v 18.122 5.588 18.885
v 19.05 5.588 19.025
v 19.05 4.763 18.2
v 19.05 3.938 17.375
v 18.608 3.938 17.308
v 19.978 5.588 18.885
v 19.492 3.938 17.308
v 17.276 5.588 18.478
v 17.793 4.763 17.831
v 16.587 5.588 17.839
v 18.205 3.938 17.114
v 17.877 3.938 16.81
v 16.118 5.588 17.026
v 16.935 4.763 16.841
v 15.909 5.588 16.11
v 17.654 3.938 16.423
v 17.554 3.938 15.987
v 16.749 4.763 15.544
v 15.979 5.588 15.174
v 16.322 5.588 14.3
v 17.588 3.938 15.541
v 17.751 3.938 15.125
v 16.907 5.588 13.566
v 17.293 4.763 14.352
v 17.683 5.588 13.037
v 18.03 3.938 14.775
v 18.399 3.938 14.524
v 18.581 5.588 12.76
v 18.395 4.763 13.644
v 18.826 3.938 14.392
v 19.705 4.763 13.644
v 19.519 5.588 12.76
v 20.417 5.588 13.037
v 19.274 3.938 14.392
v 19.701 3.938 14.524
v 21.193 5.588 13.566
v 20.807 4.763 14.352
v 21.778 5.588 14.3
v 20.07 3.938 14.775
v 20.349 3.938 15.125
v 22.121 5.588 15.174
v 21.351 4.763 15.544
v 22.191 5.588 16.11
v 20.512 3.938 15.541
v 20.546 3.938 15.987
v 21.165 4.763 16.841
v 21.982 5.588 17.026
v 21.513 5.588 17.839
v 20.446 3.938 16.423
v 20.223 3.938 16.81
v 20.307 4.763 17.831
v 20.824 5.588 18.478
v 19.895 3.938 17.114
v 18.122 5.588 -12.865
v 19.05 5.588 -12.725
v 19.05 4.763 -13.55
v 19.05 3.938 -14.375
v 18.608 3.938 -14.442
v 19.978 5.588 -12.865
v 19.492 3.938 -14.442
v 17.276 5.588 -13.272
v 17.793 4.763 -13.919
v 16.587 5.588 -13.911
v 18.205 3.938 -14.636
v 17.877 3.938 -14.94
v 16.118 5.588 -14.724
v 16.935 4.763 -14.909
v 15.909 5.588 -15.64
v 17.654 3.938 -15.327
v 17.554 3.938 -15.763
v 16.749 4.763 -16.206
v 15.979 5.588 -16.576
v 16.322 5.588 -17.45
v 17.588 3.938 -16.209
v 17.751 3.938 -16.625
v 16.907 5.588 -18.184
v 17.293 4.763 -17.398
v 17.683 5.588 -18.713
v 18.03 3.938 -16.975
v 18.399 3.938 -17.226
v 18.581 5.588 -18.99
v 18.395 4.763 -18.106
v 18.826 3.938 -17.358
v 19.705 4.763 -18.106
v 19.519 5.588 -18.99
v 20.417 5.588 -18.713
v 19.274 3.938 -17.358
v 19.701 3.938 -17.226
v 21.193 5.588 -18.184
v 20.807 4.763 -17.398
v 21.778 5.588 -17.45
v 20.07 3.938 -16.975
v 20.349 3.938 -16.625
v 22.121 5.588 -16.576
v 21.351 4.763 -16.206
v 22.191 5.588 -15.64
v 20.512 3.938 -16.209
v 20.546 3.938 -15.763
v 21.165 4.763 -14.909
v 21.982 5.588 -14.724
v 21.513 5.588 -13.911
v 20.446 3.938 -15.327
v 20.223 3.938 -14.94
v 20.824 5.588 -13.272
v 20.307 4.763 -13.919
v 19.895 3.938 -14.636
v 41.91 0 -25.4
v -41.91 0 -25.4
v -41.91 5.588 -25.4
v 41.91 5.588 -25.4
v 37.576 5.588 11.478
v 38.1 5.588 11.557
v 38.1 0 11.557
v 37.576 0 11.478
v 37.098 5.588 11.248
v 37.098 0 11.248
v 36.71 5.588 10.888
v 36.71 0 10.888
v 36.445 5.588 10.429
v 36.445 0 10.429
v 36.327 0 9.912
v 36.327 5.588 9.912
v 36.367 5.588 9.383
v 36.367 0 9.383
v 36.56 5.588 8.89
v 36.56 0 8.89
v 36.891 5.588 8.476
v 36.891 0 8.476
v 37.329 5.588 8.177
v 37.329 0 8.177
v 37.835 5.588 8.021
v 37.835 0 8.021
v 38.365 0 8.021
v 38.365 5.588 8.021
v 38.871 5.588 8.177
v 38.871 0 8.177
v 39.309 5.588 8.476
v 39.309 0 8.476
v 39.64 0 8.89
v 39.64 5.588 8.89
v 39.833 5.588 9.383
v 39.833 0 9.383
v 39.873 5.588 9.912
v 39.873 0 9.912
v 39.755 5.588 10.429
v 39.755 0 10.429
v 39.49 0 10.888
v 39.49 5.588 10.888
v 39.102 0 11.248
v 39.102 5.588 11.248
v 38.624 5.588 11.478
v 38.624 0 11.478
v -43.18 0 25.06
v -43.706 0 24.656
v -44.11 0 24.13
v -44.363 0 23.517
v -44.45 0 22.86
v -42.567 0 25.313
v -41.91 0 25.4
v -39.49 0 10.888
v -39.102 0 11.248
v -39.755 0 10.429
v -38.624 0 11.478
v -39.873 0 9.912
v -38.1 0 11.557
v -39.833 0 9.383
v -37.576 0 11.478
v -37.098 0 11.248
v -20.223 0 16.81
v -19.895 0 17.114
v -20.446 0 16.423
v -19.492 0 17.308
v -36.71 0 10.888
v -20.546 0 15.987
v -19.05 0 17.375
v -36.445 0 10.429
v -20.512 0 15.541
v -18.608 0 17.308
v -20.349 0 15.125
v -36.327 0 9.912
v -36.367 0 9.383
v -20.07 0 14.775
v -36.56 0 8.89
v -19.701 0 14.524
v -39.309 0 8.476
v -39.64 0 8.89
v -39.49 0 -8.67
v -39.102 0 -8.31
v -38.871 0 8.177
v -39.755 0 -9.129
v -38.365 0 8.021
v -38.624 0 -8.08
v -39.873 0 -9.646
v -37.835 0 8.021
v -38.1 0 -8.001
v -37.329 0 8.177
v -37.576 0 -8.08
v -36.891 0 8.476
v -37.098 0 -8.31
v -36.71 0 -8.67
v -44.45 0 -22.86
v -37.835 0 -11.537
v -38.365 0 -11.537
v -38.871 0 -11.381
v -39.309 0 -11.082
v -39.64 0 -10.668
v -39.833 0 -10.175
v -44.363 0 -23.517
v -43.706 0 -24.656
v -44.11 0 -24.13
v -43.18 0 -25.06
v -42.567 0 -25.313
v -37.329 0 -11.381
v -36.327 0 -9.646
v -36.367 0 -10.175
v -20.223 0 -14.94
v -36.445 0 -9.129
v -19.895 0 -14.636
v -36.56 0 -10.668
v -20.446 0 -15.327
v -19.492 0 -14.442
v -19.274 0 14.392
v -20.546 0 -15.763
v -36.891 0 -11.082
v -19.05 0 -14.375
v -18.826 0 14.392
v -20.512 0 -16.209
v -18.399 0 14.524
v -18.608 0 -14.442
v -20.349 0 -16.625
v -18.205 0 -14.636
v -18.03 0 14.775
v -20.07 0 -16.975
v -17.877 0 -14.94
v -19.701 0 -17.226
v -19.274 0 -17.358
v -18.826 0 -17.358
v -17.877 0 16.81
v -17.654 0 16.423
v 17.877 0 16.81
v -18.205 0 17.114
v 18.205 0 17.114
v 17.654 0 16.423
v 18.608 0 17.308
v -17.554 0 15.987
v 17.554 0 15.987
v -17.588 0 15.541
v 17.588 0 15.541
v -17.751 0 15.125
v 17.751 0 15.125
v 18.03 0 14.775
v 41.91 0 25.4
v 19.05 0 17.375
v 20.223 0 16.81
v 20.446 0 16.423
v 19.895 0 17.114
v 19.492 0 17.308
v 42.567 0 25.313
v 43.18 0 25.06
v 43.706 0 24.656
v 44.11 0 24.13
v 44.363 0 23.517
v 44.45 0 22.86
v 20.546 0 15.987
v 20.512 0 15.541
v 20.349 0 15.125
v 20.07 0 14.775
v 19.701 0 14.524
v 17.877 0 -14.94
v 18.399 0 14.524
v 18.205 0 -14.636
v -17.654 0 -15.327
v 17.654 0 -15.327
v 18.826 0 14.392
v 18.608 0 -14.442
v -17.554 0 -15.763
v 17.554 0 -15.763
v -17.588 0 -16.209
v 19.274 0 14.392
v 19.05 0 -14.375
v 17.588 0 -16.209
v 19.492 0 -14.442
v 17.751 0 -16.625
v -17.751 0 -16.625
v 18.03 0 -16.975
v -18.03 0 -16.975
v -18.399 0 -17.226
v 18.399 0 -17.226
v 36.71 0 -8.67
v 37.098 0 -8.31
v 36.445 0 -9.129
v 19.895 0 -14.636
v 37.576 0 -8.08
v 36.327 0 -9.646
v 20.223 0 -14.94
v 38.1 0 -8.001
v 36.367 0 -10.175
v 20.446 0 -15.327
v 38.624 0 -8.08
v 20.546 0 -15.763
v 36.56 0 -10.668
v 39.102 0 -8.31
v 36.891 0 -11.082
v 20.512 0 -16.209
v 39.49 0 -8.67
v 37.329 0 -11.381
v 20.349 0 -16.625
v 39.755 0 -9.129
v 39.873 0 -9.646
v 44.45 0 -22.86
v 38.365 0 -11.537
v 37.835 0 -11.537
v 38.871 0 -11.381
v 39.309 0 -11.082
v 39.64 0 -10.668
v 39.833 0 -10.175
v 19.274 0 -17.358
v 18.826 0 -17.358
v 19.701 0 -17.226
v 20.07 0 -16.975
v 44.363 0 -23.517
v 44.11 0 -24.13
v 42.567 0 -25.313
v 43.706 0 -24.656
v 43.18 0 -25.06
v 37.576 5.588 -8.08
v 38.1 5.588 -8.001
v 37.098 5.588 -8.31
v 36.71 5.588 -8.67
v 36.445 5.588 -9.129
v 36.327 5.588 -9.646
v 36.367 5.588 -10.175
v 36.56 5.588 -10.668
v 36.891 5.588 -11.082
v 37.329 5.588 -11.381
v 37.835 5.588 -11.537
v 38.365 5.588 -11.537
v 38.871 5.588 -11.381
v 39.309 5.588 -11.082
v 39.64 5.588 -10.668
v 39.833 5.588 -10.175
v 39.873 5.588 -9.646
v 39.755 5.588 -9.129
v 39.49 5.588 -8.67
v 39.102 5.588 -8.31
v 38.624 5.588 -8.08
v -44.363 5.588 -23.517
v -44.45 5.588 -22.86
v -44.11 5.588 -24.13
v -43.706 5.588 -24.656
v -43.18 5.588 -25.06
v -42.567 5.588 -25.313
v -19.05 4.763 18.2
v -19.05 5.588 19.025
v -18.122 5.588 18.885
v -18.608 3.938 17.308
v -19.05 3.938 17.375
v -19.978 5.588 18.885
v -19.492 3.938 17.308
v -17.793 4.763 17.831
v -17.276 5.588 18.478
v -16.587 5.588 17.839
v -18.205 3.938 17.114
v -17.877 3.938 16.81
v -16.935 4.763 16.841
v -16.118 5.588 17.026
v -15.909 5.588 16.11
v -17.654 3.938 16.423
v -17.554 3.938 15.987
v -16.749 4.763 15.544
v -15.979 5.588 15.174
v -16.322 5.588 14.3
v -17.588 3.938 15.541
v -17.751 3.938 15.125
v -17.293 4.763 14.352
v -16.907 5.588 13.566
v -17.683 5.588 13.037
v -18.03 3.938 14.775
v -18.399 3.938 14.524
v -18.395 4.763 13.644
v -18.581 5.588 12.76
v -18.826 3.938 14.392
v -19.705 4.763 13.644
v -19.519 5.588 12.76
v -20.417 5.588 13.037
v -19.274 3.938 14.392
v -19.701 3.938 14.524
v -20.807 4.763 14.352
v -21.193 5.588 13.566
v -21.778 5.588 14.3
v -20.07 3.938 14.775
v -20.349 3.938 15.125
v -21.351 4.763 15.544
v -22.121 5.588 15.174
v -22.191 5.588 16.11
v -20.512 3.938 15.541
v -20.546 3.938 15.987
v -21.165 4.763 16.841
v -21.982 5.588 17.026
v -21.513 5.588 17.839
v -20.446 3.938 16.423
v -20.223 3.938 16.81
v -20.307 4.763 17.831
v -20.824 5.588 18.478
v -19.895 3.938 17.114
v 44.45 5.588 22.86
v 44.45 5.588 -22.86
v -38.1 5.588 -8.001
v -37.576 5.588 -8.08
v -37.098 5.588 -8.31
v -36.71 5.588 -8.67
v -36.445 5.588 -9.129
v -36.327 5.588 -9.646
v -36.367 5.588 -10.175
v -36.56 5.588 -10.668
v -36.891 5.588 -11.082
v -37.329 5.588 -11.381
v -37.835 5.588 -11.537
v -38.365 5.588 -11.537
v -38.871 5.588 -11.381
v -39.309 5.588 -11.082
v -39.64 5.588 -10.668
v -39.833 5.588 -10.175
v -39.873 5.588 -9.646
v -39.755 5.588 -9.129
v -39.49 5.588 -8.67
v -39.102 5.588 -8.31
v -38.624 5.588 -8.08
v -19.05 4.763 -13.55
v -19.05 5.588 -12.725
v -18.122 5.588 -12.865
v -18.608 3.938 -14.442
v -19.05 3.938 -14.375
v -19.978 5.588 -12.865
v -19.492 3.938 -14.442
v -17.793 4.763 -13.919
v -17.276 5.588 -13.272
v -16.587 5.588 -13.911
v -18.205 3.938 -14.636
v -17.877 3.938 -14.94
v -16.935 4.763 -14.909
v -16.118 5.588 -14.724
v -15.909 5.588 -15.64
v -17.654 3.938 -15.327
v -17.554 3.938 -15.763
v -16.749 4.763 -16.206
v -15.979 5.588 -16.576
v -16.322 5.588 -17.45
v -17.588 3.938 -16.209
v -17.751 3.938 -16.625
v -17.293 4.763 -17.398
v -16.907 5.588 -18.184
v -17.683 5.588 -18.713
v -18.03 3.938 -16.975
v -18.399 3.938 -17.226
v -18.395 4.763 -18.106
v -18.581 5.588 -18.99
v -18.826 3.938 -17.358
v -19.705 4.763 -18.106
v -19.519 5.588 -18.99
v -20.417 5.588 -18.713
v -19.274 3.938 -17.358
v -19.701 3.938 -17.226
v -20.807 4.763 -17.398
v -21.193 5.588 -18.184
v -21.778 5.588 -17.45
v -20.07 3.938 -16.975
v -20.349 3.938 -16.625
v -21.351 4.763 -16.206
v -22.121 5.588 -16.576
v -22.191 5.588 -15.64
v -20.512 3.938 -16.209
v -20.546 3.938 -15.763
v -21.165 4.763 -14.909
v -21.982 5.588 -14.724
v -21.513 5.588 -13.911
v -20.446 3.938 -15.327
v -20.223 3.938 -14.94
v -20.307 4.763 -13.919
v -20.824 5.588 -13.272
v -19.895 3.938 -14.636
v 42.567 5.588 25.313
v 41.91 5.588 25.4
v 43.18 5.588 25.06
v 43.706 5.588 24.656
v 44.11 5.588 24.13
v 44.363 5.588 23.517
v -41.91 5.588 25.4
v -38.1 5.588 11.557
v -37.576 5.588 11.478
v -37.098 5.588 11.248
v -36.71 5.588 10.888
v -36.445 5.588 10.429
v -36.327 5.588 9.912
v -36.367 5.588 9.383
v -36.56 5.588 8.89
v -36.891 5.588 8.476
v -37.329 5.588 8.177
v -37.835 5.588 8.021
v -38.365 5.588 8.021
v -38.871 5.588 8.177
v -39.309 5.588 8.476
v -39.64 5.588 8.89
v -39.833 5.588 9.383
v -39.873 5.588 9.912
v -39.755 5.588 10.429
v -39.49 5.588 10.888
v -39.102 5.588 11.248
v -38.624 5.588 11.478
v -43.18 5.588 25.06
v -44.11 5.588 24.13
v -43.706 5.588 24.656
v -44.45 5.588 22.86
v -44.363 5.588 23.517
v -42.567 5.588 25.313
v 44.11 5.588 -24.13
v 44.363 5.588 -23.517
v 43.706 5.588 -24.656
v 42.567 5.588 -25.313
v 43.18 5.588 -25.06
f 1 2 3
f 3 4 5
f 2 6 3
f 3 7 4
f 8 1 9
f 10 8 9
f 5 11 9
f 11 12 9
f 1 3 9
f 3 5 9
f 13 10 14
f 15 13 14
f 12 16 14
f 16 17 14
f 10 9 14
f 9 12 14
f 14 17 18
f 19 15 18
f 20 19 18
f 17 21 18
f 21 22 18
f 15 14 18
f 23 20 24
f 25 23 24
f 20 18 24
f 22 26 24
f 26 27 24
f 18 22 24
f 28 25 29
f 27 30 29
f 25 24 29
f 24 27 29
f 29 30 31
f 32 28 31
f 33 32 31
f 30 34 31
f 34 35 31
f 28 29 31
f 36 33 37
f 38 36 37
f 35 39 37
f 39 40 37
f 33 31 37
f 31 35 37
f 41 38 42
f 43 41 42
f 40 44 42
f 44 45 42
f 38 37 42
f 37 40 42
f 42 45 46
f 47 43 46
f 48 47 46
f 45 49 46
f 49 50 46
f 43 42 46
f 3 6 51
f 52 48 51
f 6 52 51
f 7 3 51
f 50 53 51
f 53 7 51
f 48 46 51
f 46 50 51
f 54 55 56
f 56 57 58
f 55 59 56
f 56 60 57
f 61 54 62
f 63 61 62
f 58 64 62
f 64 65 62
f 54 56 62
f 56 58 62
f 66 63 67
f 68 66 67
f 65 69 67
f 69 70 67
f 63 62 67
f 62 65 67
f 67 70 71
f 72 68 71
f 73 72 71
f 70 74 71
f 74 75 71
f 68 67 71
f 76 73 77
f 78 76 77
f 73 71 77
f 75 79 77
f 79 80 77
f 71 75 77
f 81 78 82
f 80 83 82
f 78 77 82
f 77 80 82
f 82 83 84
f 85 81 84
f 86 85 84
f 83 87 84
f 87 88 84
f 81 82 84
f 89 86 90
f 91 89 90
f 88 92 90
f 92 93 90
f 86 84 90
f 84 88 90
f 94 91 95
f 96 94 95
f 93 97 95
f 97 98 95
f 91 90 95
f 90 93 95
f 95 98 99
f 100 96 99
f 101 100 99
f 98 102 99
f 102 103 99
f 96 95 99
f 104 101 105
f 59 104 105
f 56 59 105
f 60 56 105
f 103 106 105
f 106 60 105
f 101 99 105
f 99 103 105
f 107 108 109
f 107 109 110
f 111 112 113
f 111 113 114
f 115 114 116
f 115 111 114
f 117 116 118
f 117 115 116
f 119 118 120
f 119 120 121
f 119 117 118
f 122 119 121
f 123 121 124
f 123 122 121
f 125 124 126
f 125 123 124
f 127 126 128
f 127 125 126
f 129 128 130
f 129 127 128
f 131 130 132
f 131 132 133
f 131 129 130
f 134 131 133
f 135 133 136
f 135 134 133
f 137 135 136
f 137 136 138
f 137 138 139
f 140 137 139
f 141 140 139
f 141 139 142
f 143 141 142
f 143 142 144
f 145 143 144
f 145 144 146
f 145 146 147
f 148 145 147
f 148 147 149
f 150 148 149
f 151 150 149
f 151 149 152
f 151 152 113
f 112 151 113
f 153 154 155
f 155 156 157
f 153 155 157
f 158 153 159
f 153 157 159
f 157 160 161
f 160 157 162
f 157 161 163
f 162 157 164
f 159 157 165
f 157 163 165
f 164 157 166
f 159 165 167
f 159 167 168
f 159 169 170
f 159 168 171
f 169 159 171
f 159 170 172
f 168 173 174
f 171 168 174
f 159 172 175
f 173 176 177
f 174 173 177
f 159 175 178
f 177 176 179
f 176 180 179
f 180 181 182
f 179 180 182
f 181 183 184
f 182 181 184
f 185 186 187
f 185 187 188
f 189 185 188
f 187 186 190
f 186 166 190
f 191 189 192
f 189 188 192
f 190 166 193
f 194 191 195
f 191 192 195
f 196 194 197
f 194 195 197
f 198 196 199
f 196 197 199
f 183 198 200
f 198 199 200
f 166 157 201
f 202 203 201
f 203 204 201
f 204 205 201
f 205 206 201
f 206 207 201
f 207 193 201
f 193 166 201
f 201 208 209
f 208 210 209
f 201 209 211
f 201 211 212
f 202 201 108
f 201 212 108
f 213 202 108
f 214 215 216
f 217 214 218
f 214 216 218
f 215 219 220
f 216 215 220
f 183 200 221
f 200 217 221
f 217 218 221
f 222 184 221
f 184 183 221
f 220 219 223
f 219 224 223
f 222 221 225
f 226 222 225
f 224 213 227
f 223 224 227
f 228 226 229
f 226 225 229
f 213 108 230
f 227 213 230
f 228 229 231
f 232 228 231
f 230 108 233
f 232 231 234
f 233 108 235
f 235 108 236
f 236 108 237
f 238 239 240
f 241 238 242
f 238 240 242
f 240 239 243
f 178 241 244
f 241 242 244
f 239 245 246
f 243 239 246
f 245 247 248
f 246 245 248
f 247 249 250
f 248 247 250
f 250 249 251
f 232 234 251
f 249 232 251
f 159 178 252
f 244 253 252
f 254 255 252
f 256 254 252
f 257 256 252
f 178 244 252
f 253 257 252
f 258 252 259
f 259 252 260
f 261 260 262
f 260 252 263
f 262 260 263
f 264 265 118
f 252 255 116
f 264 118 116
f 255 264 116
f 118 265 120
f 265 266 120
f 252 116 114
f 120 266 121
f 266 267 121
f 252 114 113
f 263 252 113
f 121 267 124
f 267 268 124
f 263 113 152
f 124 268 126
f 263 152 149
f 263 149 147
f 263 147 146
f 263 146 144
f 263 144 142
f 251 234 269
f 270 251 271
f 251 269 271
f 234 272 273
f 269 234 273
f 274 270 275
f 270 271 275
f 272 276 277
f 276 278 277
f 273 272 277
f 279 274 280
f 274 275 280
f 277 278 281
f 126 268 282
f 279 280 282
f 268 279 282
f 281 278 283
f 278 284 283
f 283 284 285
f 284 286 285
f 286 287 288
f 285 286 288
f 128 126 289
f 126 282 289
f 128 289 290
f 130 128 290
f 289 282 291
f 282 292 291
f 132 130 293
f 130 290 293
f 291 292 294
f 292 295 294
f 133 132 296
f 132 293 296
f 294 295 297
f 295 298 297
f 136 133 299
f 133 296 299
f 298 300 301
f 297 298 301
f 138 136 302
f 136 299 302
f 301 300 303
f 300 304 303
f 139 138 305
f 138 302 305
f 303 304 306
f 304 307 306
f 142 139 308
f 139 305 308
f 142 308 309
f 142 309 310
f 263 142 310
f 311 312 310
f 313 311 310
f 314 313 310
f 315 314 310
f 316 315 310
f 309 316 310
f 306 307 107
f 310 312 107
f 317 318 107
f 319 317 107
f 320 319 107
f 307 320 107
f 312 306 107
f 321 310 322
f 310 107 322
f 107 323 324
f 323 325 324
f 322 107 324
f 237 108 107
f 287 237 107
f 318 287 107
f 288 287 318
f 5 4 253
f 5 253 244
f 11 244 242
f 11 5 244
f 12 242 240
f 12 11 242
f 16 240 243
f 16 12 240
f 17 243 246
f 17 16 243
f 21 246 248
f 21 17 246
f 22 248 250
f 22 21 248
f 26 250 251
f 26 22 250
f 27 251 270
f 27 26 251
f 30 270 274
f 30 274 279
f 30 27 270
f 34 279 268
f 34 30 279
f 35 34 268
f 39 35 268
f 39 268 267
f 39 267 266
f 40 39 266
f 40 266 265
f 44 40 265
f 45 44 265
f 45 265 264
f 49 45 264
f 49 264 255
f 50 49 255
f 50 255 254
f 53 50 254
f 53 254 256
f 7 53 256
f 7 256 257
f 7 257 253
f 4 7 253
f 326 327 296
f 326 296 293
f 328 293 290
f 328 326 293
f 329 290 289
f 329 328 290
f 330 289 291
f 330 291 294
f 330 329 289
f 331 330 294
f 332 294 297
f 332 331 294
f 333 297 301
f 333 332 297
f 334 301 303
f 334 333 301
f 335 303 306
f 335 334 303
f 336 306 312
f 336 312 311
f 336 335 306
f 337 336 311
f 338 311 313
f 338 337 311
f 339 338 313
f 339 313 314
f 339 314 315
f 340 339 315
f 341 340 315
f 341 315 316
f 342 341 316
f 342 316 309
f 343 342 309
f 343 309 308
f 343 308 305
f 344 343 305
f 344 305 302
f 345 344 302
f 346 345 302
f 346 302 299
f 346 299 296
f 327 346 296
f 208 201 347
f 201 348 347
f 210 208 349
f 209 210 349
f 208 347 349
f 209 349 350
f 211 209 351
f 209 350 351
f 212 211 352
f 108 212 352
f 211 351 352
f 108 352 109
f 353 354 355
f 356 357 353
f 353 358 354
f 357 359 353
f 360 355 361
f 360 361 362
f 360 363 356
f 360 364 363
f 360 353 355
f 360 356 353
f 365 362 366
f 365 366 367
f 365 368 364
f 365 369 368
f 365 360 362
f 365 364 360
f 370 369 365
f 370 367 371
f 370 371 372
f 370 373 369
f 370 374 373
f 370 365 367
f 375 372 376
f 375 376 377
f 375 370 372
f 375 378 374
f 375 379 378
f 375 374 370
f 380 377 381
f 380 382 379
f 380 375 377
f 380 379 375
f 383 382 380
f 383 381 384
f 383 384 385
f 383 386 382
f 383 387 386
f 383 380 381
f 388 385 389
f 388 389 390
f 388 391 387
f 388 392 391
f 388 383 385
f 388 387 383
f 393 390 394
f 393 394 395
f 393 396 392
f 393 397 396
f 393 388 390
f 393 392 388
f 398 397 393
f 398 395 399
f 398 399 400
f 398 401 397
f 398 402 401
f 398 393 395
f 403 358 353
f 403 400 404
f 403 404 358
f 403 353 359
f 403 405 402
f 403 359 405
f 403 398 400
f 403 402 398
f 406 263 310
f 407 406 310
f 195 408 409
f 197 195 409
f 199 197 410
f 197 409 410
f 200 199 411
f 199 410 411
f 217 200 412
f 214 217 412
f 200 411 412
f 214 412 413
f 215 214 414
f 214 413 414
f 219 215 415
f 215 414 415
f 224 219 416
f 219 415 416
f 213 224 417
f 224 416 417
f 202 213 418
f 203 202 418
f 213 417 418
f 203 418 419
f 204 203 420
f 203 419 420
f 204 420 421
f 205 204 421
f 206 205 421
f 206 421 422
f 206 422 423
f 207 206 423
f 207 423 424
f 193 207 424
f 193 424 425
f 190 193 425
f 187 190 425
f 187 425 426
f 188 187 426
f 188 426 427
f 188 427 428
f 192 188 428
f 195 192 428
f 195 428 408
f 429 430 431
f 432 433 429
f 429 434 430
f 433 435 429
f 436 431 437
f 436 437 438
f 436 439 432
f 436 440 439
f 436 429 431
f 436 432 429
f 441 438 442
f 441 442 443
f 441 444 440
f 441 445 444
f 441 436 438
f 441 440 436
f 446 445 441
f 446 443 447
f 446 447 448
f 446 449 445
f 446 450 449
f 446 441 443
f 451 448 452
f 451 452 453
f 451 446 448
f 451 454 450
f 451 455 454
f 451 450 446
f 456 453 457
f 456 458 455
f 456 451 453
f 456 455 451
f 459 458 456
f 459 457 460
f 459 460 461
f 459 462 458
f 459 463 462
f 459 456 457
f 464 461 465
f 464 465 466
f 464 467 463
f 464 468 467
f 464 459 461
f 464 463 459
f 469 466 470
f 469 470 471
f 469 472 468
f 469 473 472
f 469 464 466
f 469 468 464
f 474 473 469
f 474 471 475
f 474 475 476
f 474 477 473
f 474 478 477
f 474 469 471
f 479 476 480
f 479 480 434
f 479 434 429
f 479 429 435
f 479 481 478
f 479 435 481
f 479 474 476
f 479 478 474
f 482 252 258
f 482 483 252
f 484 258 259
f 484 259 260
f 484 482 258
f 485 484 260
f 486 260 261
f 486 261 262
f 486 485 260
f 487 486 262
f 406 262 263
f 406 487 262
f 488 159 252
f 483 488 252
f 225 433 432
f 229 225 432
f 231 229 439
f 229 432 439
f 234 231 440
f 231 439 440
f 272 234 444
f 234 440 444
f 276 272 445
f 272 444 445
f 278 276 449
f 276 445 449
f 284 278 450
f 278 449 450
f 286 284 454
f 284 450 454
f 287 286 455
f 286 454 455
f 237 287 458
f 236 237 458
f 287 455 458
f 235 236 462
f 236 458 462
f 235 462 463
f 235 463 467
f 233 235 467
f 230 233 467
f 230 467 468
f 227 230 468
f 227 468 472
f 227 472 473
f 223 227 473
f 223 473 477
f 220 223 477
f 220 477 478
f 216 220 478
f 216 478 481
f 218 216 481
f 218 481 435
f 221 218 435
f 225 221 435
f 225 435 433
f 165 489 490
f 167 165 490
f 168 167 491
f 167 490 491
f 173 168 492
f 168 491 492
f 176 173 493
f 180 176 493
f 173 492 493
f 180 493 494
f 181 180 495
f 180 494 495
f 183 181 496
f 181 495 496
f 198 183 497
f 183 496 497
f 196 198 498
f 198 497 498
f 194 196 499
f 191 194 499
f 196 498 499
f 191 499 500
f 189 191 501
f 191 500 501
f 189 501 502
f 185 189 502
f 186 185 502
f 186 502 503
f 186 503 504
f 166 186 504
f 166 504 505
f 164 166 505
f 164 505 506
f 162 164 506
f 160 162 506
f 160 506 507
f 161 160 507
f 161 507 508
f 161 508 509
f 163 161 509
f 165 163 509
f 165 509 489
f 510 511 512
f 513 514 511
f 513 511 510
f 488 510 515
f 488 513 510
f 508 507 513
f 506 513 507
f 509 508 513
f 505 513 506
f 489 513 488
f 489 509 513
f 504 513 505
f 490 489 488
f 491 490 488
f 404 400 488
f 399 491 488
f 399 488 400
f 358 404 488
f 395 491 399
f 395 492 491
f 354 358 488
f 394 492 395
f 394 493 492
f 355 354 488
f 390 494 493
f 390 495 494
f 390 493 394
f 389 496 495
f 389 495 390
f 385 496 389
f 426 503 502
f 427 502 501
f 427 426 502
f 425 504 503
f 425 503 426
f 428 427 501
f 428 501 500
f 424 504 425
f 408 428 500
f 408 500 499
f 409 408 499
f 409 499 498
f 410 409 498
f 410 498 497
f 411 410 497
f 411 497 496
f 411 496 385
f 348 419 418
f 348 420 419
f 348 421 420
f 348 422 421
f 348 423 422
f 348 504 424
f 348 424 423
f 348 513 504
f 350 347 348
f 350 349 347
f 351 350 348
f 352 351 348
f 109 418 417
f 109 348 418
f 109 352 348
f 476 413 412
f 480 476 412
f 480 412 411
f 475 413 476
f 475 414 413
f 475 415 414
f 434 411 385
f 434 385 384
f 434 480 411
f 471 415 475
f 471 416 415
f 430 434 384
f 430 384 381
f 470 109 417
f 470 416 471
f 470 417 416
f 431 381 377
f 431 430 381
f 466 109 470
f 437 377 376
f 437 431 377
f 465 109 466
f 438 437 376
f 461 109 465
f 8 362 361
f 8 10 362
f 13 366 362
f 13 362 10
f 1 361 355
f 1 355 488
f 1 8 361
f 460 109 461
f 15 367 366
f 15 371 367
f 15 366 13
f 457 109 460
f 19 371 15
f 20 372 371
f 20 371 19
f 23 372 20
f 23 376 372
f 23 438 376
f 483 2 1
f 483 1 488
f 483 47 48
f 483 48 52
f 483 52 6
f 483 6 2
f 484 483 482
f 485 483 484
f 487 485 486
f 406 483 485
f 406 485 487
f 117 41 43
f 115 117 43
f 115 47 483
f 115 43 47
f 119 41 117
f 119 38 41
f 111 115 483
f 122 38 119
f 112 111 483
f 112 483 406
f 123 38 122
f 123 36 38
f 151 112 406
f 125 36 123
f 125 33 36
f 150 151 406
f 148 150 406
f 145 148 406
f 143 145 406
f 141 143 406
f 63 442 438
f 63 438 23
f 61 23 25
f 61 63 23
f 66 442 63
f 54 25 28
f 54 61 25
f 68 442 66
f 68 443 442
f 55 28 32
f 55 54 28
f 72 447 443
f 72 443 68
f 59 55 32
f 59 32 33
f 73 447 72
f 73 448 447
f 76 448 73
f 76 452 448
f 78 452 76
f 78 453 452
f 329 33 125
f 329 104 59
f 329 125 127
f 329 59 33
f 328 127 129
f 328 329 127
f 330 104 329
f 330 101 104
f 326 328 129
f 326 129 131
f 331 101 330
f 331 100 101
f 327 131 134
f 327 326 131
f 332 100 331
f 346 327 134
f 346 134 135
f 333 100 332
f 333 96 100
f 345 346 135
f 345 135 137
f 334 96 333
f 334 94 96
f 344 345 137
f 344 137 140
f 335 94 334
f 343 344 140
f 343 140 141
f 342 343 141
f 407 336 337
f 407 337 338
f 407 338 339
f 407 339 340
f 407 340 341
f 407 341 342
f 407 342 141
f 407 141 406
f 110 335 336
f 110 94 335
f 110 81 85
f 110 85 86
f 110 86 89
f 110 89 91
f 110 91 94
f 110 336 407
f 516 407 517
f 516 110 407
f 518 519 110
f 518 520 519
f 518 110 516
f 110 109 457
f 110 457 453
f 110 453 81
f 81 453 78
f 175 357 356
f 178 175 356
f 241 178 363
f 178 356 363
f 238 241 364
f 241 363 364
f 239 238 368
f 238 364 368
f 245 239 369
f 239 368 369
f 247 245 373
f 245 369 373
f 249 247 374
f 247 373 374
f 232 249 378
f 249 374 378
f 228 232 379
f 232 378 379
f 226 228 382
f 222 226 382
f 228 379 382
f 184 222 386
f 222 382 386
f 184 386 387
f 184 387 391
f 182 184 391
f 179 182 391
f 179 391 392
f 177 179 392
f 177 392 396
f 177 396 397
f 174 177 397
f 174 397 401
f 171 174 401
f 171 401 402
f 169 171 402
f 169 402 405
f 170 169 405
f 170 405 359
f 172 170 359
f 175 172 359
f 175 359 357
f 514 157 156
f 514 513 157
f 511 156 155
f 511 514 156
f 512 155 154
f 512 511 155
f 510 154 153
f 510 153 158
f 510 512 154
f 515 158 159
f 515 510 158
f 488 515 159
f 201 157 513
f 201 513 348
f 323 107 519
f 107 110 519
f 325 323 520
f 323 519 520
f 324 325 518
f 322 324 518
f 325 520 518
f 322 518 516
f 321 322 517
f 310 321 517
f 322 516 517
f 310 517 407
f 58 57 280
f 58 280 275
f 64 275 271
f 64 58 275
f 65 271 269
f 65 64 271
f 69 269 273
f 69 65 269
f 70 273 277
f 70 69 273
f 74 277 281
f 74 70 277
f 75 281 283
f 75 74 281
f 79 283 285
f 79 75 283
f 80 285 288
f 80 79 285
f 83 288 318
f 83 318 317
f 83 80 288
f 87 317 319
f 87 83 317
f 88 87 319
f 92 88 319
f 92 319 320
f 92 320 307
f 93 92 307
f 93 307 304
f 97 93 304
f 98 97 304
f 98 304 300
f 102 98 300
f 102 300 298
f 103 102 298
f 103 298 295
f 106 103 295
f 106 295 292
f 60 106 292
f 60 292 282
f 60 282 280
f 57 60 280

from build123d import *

# Parameters (mm, degrees)
SKETCH1_W           = 88.9
SKETCH1_H           = 50.8
BOSS_EXTRUDE1_DEPTH = 5.588
CUT_EXTRUDE1_REACH  = 53.499
SKETCH2_R           = 1.778
SKETCH2_R_2         = 1.5
FILLET1_R           = 2.54
CHAMFER1_SIZE       = 1.65


with BuildPart() as part:
    # Sketch1 → Boss-Extrude1 (new body)
    with BuildSketch(Plane(origin=(0, 0, 0), x_dir=(1, 0, 0), z_dir=(0, 1, 0))):
        Rectangle(SKETCH1_W, SKETCH1_H)
    extrude(amount=BOSS_EXTRUDE1_DEPTH)

    # Sketch2 → Cut-Extrude1 (cut, up to next)
    with BuildSketch(Plane(origin=(0, 5.588, 0), x_dir=(1, 0, 0), z_dir=(0, 1, 0)), mode=Mode.PRIVATE) as cut_extrude1_sk1:
        with Locations(Location((-38.1, -9.779, 0), (0, 0, 270))):
            Circle(SKETCH2_R)
    cut_extrude1_tool1 = extrude(cut_extrude1_sk1.sketch, amount=-CUT_EXTRUDE1_REACH, mode=Mode.PRIVATE) & part.part
    # Sketch2 → Cut-Extrude1 (cut, up to next)
    with BuildSketch(Plane(origin=(0, 5.588, 0), x_dir=(1, 0, 0), z_dir=(0, 1, 0)), mode=Mode.PRIVATE) as cut_extrude1_sk2:
        with Locations(Location((-38.1, 9.779, 0), (0, 0, 270))):
            Circle(SKETCH2_R)
    cut_extrude1_tool2 = extrude(cut_extrude1_sk2.sketch, amount=-CUT_EXTRUDE1_REACH, mode=Mode.PRIVATE) & part.part
    # Sketch2 → Cut-Extrude1 (cut, up to next)
    with BuildSketch(Plane(origin=(0, 5.588, 0), x_dir=(1, 0, 0), z_dir=(0, 1, 0)), mode=Mode.PRIVATE) as cut_extrude1_sk3:
        with Locations(Location((-19.05, -15.875, 0), (0, 0, 270))):
            Circle(SKETCH2_R_2)
    cut_extrude1_tool3 = extrude(cut_extrude1_sk3.sketch, amount=-CUT_EXTRUDE1_REACH, mode=Mode.PRIVATE) & part.part
    # Sketch2 → Cut-Extrude1 (cut, up to next)
    with BuildSketch(Plane(origin=(0, 5.588, 0), x_dir=(1, 0, 0), z_dir=(0, 1, 0)), mode=Mode.PRIVATE) as cut_extrude1_sk4:
        with Locations(Location((-19.05, 15.875, 0), (0, 0, 270))):
            Circle(SKETCH2_R_2)
    cut_extrude1_tool4 = extrude(cut_extrude1_sk4.sketch, amount=-CUT_EXTRUDE1_REACH, mode=Mode.PRIVATE) & part.part
    cut_extrude1_1 = cut_extrude1_tool1.solids().sort_by_distance((-38.1, 5.588, 9.779))[0]
    add(cut_extrude1_1, mode=Mode.SUBTRACT)
    cut_extrude1_2 = cut_extrude1_tool2.solids().sort_by_distance((-38.1, 5.588, -9.779))[0]
    add(cut_extrude1_2, mode=Mode.SUBTRACT)
    cut_extrude1_3 = cut_extrude1_tool3.solids().sort_by_distance((-19.05, 5.588, 15.875))[0]
    add(cut_extrude1_3, mode=Mode.SUBTRACT)
    cut_extrude1_4 = cut_extrude1_tool4.solids().sort_by_distance((-19.05, 5.588, -15.875))[0]
    add(cut_extrude1_4, mode=Mode.SUBTRACT)
    cut_extrude1 = cut_extrude1_1 + cut_extrude1_2 + cut_extrude1_3 + cut_extrude1_4  # Cut-Extrude1 as one shape, for the pattern or mirror that repeats it

    # Mirror1: Cut-Extrude1 across plane
    add(cut_extrude1.mirror(Plane(origin=(0, 0, 0), x_dir=(0, 0, 1), z_dir=(1, 0, 0))), mode=Mode.SUBTRACT)

    # Fillet1
    fillet1_edges = [part.edges().sort_by_distance(p)[0] for p in [
        (44.45, 2.794, 25.4),
        (-44.45, 2.794, 25.4),
        (-44.45, 2.794, -25.4),
        (44.45, 2.794, -25.4),
    ]]
    fillet(fillet1_edges, radius=FILLET1_R)

    # Chamfer1
    chamfer1_edges = [part.edges().sort_by_distance(p)[0] for p in [
        (-19.05, 5.588, -17.375),
        (-19.05, 5.588, 14.375),
        (19.05, 5.588, -17.375),
        (19.05, 5.588, 14.375),
    ]]
    chamfer(chamfer1_edges, length=CHAMFER1_SIZE)


solid = part.part
